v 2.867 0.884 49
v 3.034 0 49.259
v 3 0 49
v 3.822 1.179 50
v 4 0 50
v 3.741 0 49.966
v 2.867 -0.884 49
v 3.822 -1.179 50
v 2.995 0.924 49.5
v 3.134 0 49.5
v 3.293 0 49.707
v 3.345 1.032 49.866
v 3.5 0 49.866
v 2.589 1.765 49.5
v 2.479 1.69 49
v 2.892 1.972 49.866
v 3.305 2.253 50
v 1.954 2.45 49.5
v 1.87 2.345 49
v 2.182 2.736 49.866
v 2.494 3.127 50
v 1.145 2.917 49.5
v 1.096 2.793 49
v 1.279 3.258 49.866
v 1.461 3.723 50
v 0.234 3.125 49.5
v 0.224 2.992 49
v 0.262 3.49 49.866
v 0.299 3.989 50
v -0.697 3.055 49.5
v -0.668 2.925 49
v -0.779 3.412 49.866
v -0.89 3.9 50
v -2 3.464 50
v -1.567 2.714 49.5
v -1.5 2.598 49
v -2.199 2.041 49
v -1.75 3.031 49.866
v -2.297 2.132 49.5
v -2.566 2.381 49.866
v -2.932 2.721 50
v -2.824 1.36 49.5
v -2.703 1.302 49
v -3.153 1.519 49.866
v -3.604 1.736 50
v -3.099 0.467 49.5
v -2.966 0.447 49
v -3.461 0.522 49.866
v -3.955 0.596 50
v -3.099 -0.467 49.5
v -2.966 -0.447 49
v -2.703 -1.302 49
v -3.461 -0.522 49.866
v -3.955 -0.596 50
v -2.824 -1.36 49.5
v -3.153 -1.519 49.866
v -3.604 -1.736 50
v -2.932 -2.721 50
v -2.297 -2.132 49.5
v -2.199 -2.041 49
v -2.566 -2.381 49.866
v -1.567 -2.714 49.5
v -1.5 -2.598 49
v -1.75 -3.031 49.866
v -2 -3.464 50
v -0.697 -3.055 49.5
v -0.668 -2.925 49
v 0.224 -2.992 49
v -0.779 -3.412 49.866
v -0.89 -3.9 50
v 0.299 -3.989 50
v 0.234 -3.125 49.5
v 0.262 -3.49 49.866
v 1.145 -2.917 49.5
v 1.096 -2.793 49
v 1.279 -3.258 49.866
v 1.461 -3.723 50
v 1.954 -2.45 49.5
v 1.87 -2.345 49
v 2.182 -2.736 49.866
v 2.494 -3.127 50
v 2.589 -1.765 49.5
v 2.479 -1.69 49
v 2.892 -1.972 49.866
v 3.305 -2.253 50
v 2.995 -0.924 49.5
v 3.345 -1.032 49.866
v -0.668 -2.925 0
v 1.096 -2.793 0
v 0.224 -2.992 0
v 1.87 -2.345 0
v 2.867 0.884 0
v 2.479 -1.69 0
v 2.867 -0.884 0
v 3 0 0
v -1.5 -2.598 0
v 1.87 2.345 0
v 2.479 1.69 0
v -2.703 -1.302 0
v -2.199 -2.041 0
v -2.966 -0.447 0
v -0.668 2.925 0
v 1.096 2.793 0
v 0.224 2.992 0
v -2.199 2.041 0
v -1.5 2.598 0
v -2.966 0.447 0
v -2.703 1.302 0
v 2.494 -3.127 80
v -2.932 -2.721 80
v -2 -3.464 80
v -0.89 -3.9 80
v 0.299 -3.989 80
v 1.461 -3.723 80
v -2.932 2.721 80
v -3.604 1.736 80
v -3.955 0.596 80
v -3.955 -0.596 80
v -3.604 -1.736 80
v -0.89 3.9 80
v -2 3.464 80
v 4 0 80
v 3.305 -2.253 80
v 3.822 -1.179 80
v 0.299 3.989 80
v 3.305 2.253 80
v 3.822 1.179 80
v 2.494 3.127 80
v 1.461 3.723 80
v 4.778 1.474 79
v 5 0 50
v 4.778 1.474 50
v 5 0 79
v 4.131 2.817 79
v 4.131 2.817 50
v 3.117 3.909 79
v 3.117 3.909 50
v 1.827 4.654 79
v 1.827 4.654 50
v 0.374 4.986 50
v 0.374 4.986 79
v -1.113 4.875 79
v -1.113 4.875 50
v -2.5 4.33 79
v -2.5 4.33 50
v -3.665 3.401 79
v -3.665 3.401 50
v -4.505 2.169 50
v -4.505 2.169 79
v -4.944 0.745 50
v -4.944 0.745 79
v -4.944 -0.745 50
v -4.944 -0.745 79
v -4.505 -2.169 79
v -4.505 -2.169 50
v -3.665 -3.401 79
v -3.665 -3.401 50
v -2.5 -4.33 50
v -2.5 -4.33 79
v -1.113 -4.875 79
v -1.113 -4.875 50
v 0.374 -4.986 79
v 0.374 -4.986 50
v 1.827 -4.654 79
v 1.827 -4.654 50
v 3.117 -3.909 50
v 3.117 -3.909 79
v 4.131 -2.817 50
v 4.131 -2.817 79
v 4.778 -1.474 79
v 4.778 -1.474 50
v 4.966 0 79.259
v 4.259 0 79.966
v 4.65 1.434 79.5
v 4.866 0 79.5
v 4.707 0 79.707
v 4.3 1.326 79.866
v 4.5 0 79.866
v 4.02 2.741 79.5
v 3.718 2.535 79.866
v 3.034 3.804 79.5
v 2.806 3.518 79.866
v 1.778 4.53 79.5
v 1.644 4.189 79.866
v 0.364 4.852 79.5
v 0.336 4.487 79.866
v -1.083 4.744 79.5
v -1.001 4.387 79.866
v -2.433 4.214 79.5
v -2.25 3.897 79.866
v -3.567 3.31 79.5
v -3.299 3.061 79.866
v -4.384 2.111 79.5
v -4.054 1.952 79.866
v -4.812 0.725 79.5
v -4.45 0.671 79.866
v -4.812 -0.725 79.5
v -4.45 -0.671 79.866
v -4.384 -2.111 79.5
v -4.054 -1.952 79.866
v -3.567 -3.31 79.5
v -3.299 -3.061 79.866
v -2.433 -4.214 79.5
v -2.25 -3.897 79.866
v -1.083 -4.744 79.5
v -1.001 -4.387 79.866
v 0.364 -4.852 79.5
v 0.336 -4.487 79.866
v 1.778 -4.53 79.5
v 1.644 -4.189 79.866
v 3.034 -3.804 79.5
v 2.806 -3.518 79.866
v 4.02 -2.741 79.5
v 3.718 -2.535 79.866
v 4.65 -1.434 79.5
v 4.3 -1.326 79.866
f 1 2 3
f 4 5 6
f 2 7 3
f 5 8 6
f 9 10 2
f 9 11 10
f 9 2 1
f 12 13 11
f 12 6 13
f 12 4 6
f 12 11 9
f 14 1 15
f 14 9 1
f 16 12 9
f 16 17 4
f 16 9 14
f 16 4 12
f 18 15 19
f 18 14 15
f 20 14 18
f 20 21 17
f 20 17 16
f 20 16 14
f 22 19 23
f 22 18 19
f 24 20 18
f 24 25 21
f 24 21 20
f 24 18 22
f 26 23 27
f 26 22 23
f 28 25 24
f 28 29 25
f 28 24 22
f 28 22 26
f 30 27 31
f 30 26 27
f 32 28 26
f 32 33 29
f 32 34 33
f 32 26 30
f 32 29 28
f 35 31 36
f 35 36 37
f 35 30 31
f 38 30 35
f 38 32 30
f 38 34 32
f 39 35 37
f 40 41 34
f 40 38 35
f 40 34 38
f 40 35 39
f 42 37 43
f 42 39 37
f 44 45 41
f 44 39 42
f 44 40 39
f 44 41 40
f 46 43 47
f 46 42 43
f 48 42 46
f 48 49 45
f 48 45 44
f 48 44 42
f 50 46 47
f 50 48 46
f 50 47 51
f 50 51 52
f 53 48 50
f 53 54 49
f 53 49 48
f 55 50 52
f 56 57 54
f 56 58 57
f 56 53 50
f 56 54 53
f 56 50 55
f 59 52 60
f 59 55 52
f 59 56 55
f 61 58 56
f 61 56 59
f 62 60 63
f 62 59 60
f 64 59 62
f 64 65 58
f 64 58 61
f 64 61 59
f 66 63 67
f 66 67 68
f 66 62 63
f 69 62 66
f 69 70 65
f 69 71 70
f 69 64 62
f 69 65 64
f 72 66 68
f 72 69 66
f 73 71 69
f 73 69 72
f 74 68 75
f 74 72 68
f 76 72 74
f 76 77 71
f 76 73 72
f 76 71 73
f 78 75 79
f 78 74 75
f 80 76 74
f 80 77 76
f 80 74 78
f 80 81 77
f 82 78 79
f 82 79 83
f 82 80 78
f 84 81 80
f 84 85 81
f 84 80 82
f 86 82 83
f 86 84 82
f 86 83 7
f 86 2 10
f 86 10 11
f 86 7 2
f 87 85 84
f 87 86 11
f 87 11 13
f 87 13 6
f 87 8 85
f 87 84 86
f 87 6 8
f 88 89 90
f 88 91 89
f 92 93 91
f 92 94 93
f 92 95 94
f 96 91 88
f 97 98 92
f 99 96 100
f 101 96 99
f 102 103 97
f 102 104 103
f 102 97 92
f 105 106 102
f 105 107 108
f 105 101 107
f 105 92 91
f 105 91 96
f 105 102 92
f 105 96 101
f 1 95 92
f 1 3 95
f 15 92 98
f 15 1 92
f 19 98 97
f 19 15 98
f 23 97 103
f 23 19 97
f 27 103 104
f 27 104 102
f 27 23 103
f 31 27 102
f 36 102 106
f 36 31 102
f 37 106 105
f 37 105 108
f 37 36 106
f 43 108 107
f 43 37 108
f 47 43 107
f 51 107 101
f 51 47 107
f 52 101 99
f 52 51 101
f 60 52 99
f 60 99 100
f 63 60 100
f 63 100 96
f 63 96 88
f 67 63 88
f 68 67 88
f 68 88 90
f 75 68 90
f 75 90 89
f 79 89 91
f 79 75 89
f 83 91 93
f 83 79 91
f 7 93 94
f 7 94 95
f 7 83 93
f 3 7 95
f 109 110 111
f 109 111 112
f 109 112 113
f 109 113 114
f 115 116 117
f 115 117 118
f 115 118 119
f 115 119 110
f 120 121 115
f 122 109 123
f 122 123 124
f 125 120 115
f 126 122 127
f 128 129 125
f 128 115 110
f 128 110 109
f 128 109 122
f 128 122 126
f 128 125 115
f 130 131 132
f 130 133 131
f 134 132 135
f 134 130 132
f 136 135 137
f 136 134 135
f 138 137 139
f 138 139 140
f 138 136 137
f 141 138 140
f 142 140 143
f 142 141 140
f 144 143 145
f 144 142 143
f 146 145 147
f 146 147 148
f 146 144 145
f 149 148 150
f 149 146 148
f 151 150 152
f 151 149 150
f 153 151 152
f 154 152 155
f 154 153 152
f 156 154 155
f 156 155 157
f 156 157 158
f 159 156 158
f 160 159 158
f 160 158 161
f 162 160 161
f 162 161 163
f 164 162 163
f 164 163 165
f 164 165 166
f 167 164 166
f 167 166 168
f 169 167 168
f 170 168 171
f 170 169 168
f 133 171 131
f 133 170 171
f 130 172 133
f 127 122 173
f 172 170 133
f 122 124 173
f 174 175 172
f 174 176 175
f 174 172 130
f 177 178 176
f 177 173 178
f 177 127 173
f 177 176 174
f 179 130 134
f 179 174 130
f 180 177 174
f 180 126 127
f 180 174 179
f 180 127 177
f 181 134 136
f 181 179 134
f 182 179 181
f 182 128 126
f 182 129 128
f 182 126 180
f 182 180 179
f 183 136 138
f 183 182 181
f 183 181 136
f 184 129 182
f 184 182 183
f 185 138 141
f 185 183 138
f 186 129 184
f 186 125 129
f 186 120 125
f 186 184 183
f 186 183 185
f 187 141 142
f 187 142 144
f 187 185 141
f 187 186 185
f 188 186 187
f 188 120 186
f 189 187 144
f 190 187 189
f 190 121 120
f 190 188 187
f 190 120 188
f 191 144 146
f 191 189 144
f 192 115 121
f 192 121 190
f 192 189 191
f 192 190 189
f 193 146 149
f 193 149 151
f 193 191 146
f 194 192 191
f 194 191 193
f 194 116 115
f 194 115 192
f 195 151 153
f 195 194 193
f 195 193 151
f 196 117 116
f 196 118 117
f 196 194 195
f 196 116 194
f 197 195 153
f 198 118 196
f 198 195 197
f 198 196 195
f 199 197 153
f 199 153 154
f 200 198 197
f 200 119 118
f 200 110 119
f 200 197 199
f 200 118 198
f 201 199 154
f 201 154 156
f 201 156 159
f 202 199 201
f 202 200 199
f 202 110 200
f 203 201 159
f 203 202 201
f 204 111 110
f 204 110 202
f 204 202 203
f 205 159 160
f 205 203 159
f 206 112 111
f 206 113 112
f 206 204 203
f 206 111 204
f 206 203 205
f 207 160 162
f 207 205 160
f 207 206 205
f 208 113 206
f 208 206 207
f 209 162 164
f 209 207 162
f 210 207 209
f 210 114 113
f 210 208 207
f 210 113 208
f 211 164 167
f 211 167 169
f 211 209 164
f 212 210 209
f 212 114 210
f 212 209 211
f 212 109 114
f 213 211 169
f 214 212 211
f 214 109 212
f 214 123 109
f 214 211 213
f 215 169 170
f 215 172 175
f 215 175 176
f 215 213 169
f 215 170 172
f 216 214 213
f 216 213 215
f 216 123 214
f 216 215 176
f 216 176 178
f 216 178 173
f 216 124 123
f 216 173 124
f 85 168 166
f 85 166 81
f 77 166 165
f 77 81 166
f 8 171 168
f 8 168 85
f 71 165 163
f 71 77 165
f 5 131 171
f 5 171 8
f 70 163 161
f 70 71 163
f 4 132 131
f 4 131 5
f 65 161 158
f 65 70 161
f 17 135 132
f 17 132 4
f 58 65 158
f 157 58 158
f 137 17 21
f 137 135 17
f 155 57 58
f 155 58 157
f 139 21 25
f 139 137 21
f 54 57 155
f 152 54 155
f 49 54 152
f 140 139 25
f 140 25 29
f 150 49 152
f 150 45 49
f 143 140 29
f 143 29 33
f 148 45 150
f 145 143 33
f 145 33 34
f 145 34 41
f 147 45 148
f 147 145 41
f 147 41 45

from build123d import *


with BuildPart() as f1:
    # F0 (on Front) → F1 (revolve)
    with BuildSketch(Plane.XZ):
        with BuildLine():
            Line((0, 80), (0, 0))
            Line((0, 0), (3, 0))
            Line((3, 0), (3, 49))
            ThreePointArc((3, 49), (3.292893, 49.707107), (4, 50))
            Line((4, 50), (5, 50))
            Line((5, 50), (5, 79))
            ThreePointArc((5, 79), (4.707107, 79.707107), (4, 80))
            Line((4, 80), (0, 80))
        make_face()
    revolve(axis=Axis((0, 0, 40), (0, 0, 1)))


solid = f1.part
